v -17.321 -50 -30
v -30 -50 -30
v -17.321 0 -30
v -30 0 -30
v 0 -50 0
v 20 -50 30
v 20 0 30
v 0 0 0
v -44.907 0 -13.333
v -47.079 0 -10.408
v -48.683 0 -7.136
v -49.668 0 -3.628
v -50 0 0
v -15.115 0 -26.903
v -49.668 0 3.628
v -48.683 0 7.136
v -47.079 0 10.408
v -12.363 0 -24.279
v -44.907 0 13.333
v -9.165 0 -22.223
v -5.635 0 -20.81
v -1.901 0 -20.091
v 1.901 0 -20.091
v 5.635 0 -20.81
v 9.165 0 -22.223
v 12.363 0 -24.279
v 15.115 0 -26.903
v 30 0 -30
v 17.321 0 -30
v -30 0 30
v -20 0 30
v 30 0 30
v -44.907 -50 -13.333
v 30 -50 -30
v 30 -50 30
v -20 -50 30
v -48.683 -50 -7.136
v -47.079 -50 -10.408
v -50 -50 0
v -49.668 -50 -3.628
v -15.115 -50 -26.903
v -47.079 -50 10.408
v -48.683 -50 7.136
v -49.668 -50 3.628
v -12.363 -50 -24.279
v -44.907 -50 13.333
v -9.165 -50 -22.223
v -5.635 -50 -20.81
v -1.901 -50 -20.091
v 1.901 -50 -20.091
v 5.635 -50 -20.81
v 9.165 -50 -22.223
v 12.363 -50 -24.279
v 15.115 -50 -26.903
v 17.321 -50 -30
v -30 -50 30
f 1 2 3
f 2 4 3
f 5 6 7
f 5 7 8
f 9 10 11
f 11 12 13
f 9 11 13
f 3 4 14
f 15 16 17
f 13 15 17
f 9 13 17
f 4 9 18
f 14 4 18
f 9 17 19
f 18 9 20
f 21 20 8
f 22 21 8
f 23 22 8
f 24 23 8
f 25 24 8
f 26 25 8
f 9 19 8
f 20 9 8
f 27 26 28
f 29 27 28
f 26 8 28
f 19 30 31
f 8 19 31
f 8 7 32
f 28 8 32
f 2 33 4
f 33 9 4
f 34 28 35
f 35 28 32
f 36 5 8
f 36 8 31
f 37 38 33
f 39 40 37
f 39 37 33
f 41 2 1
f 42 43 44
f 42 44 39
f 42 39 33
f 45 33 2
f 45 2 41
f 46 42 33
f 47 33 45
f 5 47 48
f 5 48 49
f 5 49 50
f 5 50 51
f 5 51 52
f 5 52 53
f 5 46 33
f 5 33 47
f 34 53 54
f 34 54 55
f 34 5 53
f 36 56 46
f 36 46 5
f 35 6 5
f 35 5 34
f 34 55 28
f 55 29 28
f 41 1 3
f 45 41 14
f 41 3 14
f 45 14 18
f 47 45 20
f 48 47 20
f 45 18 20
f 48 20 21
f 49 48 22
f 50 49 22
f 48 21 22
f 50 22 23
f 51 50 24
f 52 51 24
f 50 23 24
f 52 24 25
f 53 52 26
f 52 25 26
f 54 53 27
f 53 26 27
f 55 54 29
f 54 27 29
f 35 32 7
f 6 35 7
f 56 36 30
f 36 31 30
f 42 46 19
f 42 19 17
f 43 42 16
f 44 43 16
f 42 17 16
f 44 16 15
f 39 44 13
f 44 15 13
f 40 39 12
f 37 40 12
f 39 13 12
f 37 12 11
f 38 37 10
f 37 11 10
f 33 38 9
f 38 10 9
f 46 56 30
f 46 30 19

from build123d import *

# Parameters (mm, degrees)
F1_DEPTH = 25
F2_DEPTH = 25


# Not quite as in the source:
# - a feature of the source that left no trace in its solid (it failed there, or was rolled back) is left out


with BuildPart() as f1:
    # F0 (on Front) → F1 (new body)
    with BuildSketch(Plane.XZ):
        with BuildLine():
            Line((20, 30), (0, 0))
            Line((0, 0), (-20, 30))
            Line((-20, 30), (-30, 30))
            Line((-30, 30), (-44.90711985, 13.3333333333))
            ThreePointArc((-44.90711985, 13.3333333333), (-50, 0), (-44.90711985, -13.3333333333))
            Line((-44.90711985, -13.3333333333), (-30, -30))
            Line((-30, -30), (-17.3205080757, -30))
            ThreePointArc((-17.3205080757, -30), (0, -20), (17.3205080757, -30))
            Line((17.3205080757, -30), (30, -30))
            Line((30, -30), (30, 30))
            Line((30, 30), (20, 30))
        make_face()
    extrude(amount=F1_DEPTH)

    # F2 (add): a face of the model
    f2_faces = [f1.faces().sort_by_distance(p)[0] for p in [
        (-8.0009938, -25, -1.613641283),
    ]]
    extrude(f2_faces, amount=F2_DEPTH)


solid = f1.part
